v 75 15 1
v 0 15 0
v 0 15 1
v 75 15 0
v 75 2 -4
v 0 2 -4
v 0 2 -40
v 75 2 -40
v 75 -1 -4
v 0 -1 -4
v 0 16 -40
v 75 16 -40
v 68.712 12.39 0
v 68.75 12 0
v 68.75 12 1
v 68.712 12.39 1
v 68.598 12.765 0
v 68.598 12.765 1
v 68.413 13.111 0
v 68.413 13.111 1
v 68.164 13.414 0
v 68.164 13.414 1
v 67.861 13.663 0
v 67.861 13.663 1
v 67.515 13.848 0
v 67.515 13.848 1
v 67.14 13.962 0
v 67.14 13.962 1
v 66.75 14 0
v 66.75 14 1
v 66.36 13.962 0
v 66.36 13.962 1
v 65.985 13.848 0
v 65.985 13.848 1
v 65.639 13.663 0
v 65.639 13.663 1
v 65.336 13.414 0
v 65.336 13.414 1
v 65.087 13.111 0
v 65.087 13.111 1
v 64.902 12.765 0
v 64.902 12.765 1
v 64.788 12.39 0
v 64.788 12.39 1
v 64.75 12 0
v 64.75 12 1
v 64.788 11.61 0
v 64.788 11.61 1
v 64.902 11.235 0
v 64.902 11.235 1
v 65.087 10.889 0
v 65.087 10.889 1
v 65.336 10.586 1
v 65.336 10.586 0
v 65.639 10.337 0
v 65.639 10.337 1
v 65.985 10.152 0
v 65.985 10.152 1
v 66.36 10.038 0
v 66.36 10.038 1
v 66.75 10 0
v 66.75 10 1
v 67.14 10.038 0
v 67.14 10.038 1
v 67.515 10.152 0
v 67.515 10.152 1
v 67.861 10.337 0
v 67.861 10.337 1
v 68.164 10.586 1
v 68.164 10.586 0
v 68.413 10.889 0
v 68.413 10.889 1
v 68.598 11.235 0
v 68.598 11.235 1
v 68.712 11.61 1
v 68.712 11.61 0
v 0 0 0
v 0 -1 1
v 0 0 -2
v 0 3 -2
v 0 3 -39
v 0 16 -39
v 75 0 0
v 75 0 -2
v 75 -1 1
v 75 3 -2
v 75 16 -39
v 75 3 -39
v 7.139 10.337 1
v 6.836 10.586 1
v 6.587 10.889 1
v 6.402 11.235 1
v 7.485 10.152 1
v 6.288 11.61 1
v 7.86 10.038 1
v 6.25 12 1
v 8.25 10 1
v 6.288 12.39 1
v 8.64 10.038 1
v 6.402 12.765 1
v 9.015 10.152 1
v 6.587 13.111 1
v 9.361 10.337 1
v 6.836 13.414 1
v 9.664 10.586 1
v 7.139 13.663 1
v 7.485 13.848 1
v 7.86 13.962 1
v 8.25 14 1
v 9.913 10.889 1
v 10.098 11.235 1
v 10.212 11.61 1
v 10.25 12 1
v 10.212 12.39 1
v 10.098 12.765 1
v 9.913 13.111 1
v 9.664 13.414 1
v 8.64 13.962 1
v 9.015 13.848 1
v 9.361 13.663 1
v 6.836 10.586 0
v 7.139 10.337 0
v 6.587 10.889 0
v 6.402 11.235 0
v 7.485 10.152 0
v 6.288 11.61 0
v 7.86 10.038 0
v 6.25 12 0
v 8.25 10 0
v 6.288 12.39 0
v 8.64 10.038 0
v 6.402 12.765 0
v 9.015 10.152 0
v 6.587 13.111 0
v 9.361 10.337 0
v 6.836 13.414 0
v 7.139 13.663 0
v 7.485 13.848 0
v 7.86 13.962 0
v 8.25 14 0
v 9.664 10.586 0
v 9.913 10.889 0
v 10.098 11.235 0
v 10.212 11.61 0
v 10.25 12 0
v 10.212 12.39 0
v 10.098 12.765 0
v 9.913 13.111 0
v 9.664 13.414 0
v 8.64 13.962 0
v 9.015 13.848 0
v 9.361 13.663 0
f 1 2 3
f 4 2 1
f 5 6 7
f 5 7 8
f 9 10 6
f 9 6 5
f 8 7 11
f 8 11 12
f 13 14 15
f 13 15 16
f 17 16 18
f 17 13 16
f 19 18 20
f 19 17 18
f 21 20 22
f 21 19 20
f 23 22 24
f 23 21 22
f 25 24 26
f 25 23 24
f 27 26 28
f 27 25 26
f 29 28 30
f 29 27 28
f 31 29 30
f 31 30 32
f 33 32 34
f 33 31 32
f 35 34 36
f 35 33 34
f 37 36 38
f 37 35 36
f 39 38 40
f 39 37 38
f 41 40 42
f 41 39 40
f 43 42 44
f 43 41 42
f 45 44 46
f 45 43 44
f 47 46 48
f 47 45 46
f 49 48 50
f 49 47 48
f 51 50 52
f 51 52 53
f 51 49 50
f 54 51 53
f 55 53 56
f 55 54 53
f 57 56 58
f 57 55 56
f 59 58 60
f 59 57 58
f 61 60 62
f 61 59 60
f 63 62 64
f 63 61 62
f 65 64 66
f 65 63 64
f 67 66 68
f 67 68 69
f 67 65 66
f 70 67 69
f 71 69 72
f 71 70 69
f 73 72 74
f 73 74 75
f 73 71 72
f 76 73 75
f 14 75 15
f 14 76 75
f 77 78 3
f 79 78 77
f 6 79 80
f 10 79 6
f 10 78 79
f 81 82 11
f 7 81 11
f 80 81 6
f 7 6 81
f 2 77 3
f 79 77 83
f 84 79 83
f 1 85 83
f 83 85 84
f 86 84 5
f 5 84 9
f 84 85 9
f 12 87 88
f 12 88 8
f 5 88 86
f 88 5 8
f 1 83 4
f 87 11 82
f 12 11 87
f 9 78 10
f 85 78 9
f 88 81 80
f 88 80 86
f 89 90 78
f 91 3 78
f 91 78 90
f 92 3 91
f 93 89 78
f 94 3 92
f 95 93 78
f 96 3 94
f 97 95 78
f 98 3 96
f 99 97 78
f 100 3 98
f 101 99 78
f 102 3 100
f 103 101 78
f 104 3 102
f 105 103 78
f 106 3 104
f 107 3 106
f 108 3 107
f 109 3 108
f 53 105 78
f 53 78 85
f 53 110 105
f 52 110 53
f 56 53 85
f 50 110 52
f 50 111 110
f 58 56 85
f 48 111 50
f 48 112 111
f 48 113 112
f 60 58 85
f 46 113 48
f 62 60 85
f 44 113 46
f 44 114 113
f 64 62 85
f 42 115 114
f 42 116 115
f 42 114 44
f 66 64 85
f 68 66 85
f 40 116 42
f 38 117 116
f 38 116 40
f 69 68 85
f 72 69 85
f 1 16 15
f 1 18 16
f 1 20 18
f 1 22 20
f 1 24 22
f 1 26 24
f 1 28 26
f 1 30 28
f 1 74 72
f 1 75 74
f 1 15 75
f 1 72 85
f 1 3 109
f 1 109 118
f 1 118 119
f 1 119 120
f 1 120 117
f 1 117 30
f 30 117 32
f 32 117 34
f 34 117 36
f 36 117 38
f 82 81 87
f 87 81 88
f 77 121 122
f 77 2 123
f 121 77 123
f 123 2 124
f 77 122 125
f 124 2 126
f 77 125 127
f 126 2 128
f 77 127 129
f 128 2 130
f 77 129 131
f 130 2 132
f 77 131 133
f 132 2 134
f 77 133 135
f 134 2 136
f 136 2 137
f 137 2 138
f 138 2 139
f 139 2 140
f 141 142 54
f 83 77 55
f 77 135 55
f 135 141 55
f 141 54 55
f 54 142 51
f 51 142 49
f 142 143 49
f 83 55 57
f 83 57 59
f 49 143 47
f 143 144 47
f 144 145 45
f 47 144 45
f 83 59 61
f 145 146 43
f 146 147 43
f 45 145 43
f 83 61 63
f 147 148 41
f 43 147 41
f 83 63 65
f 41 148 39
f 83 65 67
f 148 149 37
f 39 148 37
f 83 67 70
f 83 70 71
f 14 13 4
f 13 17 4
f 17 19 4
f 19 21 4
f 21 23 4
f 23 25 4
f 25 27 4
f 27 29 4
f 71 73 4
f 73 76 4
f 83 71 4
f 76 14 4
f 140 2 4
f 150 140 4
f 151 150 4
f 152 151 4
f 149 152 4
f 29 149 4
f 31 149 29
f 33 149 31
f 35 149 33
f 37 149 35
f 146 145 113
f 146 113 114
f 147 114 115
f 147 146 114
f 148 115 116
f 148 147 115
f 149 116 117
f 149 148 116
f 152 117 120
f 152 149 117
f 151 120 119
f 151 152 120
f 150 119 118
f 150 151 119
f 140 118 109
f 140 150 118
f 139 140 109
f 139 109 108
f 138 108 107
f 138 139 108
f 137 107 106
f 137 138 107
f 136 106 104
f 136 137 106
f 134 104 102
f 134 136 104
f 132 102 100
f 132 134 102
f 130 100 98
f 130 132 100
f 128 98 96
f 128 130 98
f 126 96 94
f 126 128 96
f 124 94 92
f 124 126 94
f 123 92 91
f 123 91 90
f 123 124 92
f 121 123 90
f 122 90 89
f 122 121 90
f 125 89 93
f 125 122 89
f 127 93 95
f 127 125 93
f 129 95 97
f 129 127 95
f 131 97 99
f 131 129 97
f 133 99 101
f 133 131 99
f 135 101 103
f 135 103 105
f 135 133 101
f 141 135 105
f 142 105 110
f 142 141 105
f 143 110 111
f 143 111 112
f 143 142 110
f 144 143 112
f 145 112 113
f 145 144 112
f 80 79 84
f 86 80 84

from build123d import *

# Parameters (mm, degrees)
ESQUISSE1_W             = 75
ESQUISSE1_H             = 16
ESQUISSE1_R             = 2
BOSS_EXTRU_1_DEPTH      = 1
ESQUISSE1_3_W           = 75
ESQUISSE1_3_H           = 1
BOSS_EXTRU_2_DEPTH      = 40
ESQUISSE2_W             = 75
ESQUISSE2_H             = 1
BOSS_EXTRU_3_DEPTH      = 16
ESQUISSE3_W             = 65
ESQUISSE3_H             = 33
ENL_V_MAT_EXTRU_1_DEPTH = 3
ESQUISSE4_W             = 75
ESQUISSE4_H             = 37
BOSS_EXTRU_4_DEPTH      = 3
ESQUISSE5_W             = 75
ESQUISSE5_H             = 36
ENL_V_MAT_EXTRU_2_DEPTH = 3


with BuildPart() as part:
    # Esquisse1 → Boss.-Extru.1 (new body)
    with BuildSketch(Plane.XY):
        with Locations((37.5, 7)):
            Rectangle(ESQUISSE1_W, ESQUISSE1_H)
        with Locations((8.25, 12)):
            Circle(ESQUISSE1_R, mode=Mode.SUBTRACT)
        with Locations((66.75, 12)):
            Circle(ESQUISSE1_R, mode=Mode.SUBTRACT)
    extrude(amount=BOSS_EXTRU_1_DEPTH)

    # Esquisse1<3> → Boss.-Extru.2 (add)
    with BuildSketch(Plane.XY):
        with Locations((37.5, -0.5)):
            Rectangle(ESQUISSE1_3_W, ESQUISSE1_3_H)
    extrude(amount=-BOSS_EXTRU_2_DEPTH)

    # Esquisse2 → Boss.-Extru.3 (add)
    with BuildSketch(Plane(origin=(0, 0, 0), x_dir=(1, 0, 0), z_dir=(0, 1, 0))):
        with Locations((37.5, 39.5)):
            Rectangle(ESQUISSE2_W, ESQUISSE2_H)
    extrude(amount=BOSS_EXTRU_3_DEPTH)

    # Esquisse3 → Enlèv. mat.-Extru.1 (cut)
    with BuildSketch(Plane.XZ.offset(1)):
        with Locations((37.5, -20.5)):
            Rectangle(ESQUISSE3_W, ESQUISSE3_H)
    extrude(amount=-ENL_V_MAT_EXTRU_1_DEPTH, mode=Mode.SUBTRACT)

    # Esquisse4 → Boss.-Extru.4 (add)
    with BuildSketch(Plane(origin=(0, 0, 0), x_dir=(1, 0, 0), z_dir=(0, 1, 0))):
        with Locations((37.5, 20.5)):
            Rectangle(ESQUISSE4_W, ESQUISSE4_H)
    extrude(amount=BOSS_EXTRU_4_DEPTH)

    # Esquisse5 → Enlèv. mat.-Extru.2 (cut)
    with BuildSketch(Plane.XZ.offset(1)):
        with Locations((37.5, -22)):
            Rectangle(ESQUISSE5_W, ESQUISSE5_H)
    extrude(amount=-ENL_V_MAT_EXTRU_2_DEPTH, mode=Mode.SUBTRACT)


solid = part.part
